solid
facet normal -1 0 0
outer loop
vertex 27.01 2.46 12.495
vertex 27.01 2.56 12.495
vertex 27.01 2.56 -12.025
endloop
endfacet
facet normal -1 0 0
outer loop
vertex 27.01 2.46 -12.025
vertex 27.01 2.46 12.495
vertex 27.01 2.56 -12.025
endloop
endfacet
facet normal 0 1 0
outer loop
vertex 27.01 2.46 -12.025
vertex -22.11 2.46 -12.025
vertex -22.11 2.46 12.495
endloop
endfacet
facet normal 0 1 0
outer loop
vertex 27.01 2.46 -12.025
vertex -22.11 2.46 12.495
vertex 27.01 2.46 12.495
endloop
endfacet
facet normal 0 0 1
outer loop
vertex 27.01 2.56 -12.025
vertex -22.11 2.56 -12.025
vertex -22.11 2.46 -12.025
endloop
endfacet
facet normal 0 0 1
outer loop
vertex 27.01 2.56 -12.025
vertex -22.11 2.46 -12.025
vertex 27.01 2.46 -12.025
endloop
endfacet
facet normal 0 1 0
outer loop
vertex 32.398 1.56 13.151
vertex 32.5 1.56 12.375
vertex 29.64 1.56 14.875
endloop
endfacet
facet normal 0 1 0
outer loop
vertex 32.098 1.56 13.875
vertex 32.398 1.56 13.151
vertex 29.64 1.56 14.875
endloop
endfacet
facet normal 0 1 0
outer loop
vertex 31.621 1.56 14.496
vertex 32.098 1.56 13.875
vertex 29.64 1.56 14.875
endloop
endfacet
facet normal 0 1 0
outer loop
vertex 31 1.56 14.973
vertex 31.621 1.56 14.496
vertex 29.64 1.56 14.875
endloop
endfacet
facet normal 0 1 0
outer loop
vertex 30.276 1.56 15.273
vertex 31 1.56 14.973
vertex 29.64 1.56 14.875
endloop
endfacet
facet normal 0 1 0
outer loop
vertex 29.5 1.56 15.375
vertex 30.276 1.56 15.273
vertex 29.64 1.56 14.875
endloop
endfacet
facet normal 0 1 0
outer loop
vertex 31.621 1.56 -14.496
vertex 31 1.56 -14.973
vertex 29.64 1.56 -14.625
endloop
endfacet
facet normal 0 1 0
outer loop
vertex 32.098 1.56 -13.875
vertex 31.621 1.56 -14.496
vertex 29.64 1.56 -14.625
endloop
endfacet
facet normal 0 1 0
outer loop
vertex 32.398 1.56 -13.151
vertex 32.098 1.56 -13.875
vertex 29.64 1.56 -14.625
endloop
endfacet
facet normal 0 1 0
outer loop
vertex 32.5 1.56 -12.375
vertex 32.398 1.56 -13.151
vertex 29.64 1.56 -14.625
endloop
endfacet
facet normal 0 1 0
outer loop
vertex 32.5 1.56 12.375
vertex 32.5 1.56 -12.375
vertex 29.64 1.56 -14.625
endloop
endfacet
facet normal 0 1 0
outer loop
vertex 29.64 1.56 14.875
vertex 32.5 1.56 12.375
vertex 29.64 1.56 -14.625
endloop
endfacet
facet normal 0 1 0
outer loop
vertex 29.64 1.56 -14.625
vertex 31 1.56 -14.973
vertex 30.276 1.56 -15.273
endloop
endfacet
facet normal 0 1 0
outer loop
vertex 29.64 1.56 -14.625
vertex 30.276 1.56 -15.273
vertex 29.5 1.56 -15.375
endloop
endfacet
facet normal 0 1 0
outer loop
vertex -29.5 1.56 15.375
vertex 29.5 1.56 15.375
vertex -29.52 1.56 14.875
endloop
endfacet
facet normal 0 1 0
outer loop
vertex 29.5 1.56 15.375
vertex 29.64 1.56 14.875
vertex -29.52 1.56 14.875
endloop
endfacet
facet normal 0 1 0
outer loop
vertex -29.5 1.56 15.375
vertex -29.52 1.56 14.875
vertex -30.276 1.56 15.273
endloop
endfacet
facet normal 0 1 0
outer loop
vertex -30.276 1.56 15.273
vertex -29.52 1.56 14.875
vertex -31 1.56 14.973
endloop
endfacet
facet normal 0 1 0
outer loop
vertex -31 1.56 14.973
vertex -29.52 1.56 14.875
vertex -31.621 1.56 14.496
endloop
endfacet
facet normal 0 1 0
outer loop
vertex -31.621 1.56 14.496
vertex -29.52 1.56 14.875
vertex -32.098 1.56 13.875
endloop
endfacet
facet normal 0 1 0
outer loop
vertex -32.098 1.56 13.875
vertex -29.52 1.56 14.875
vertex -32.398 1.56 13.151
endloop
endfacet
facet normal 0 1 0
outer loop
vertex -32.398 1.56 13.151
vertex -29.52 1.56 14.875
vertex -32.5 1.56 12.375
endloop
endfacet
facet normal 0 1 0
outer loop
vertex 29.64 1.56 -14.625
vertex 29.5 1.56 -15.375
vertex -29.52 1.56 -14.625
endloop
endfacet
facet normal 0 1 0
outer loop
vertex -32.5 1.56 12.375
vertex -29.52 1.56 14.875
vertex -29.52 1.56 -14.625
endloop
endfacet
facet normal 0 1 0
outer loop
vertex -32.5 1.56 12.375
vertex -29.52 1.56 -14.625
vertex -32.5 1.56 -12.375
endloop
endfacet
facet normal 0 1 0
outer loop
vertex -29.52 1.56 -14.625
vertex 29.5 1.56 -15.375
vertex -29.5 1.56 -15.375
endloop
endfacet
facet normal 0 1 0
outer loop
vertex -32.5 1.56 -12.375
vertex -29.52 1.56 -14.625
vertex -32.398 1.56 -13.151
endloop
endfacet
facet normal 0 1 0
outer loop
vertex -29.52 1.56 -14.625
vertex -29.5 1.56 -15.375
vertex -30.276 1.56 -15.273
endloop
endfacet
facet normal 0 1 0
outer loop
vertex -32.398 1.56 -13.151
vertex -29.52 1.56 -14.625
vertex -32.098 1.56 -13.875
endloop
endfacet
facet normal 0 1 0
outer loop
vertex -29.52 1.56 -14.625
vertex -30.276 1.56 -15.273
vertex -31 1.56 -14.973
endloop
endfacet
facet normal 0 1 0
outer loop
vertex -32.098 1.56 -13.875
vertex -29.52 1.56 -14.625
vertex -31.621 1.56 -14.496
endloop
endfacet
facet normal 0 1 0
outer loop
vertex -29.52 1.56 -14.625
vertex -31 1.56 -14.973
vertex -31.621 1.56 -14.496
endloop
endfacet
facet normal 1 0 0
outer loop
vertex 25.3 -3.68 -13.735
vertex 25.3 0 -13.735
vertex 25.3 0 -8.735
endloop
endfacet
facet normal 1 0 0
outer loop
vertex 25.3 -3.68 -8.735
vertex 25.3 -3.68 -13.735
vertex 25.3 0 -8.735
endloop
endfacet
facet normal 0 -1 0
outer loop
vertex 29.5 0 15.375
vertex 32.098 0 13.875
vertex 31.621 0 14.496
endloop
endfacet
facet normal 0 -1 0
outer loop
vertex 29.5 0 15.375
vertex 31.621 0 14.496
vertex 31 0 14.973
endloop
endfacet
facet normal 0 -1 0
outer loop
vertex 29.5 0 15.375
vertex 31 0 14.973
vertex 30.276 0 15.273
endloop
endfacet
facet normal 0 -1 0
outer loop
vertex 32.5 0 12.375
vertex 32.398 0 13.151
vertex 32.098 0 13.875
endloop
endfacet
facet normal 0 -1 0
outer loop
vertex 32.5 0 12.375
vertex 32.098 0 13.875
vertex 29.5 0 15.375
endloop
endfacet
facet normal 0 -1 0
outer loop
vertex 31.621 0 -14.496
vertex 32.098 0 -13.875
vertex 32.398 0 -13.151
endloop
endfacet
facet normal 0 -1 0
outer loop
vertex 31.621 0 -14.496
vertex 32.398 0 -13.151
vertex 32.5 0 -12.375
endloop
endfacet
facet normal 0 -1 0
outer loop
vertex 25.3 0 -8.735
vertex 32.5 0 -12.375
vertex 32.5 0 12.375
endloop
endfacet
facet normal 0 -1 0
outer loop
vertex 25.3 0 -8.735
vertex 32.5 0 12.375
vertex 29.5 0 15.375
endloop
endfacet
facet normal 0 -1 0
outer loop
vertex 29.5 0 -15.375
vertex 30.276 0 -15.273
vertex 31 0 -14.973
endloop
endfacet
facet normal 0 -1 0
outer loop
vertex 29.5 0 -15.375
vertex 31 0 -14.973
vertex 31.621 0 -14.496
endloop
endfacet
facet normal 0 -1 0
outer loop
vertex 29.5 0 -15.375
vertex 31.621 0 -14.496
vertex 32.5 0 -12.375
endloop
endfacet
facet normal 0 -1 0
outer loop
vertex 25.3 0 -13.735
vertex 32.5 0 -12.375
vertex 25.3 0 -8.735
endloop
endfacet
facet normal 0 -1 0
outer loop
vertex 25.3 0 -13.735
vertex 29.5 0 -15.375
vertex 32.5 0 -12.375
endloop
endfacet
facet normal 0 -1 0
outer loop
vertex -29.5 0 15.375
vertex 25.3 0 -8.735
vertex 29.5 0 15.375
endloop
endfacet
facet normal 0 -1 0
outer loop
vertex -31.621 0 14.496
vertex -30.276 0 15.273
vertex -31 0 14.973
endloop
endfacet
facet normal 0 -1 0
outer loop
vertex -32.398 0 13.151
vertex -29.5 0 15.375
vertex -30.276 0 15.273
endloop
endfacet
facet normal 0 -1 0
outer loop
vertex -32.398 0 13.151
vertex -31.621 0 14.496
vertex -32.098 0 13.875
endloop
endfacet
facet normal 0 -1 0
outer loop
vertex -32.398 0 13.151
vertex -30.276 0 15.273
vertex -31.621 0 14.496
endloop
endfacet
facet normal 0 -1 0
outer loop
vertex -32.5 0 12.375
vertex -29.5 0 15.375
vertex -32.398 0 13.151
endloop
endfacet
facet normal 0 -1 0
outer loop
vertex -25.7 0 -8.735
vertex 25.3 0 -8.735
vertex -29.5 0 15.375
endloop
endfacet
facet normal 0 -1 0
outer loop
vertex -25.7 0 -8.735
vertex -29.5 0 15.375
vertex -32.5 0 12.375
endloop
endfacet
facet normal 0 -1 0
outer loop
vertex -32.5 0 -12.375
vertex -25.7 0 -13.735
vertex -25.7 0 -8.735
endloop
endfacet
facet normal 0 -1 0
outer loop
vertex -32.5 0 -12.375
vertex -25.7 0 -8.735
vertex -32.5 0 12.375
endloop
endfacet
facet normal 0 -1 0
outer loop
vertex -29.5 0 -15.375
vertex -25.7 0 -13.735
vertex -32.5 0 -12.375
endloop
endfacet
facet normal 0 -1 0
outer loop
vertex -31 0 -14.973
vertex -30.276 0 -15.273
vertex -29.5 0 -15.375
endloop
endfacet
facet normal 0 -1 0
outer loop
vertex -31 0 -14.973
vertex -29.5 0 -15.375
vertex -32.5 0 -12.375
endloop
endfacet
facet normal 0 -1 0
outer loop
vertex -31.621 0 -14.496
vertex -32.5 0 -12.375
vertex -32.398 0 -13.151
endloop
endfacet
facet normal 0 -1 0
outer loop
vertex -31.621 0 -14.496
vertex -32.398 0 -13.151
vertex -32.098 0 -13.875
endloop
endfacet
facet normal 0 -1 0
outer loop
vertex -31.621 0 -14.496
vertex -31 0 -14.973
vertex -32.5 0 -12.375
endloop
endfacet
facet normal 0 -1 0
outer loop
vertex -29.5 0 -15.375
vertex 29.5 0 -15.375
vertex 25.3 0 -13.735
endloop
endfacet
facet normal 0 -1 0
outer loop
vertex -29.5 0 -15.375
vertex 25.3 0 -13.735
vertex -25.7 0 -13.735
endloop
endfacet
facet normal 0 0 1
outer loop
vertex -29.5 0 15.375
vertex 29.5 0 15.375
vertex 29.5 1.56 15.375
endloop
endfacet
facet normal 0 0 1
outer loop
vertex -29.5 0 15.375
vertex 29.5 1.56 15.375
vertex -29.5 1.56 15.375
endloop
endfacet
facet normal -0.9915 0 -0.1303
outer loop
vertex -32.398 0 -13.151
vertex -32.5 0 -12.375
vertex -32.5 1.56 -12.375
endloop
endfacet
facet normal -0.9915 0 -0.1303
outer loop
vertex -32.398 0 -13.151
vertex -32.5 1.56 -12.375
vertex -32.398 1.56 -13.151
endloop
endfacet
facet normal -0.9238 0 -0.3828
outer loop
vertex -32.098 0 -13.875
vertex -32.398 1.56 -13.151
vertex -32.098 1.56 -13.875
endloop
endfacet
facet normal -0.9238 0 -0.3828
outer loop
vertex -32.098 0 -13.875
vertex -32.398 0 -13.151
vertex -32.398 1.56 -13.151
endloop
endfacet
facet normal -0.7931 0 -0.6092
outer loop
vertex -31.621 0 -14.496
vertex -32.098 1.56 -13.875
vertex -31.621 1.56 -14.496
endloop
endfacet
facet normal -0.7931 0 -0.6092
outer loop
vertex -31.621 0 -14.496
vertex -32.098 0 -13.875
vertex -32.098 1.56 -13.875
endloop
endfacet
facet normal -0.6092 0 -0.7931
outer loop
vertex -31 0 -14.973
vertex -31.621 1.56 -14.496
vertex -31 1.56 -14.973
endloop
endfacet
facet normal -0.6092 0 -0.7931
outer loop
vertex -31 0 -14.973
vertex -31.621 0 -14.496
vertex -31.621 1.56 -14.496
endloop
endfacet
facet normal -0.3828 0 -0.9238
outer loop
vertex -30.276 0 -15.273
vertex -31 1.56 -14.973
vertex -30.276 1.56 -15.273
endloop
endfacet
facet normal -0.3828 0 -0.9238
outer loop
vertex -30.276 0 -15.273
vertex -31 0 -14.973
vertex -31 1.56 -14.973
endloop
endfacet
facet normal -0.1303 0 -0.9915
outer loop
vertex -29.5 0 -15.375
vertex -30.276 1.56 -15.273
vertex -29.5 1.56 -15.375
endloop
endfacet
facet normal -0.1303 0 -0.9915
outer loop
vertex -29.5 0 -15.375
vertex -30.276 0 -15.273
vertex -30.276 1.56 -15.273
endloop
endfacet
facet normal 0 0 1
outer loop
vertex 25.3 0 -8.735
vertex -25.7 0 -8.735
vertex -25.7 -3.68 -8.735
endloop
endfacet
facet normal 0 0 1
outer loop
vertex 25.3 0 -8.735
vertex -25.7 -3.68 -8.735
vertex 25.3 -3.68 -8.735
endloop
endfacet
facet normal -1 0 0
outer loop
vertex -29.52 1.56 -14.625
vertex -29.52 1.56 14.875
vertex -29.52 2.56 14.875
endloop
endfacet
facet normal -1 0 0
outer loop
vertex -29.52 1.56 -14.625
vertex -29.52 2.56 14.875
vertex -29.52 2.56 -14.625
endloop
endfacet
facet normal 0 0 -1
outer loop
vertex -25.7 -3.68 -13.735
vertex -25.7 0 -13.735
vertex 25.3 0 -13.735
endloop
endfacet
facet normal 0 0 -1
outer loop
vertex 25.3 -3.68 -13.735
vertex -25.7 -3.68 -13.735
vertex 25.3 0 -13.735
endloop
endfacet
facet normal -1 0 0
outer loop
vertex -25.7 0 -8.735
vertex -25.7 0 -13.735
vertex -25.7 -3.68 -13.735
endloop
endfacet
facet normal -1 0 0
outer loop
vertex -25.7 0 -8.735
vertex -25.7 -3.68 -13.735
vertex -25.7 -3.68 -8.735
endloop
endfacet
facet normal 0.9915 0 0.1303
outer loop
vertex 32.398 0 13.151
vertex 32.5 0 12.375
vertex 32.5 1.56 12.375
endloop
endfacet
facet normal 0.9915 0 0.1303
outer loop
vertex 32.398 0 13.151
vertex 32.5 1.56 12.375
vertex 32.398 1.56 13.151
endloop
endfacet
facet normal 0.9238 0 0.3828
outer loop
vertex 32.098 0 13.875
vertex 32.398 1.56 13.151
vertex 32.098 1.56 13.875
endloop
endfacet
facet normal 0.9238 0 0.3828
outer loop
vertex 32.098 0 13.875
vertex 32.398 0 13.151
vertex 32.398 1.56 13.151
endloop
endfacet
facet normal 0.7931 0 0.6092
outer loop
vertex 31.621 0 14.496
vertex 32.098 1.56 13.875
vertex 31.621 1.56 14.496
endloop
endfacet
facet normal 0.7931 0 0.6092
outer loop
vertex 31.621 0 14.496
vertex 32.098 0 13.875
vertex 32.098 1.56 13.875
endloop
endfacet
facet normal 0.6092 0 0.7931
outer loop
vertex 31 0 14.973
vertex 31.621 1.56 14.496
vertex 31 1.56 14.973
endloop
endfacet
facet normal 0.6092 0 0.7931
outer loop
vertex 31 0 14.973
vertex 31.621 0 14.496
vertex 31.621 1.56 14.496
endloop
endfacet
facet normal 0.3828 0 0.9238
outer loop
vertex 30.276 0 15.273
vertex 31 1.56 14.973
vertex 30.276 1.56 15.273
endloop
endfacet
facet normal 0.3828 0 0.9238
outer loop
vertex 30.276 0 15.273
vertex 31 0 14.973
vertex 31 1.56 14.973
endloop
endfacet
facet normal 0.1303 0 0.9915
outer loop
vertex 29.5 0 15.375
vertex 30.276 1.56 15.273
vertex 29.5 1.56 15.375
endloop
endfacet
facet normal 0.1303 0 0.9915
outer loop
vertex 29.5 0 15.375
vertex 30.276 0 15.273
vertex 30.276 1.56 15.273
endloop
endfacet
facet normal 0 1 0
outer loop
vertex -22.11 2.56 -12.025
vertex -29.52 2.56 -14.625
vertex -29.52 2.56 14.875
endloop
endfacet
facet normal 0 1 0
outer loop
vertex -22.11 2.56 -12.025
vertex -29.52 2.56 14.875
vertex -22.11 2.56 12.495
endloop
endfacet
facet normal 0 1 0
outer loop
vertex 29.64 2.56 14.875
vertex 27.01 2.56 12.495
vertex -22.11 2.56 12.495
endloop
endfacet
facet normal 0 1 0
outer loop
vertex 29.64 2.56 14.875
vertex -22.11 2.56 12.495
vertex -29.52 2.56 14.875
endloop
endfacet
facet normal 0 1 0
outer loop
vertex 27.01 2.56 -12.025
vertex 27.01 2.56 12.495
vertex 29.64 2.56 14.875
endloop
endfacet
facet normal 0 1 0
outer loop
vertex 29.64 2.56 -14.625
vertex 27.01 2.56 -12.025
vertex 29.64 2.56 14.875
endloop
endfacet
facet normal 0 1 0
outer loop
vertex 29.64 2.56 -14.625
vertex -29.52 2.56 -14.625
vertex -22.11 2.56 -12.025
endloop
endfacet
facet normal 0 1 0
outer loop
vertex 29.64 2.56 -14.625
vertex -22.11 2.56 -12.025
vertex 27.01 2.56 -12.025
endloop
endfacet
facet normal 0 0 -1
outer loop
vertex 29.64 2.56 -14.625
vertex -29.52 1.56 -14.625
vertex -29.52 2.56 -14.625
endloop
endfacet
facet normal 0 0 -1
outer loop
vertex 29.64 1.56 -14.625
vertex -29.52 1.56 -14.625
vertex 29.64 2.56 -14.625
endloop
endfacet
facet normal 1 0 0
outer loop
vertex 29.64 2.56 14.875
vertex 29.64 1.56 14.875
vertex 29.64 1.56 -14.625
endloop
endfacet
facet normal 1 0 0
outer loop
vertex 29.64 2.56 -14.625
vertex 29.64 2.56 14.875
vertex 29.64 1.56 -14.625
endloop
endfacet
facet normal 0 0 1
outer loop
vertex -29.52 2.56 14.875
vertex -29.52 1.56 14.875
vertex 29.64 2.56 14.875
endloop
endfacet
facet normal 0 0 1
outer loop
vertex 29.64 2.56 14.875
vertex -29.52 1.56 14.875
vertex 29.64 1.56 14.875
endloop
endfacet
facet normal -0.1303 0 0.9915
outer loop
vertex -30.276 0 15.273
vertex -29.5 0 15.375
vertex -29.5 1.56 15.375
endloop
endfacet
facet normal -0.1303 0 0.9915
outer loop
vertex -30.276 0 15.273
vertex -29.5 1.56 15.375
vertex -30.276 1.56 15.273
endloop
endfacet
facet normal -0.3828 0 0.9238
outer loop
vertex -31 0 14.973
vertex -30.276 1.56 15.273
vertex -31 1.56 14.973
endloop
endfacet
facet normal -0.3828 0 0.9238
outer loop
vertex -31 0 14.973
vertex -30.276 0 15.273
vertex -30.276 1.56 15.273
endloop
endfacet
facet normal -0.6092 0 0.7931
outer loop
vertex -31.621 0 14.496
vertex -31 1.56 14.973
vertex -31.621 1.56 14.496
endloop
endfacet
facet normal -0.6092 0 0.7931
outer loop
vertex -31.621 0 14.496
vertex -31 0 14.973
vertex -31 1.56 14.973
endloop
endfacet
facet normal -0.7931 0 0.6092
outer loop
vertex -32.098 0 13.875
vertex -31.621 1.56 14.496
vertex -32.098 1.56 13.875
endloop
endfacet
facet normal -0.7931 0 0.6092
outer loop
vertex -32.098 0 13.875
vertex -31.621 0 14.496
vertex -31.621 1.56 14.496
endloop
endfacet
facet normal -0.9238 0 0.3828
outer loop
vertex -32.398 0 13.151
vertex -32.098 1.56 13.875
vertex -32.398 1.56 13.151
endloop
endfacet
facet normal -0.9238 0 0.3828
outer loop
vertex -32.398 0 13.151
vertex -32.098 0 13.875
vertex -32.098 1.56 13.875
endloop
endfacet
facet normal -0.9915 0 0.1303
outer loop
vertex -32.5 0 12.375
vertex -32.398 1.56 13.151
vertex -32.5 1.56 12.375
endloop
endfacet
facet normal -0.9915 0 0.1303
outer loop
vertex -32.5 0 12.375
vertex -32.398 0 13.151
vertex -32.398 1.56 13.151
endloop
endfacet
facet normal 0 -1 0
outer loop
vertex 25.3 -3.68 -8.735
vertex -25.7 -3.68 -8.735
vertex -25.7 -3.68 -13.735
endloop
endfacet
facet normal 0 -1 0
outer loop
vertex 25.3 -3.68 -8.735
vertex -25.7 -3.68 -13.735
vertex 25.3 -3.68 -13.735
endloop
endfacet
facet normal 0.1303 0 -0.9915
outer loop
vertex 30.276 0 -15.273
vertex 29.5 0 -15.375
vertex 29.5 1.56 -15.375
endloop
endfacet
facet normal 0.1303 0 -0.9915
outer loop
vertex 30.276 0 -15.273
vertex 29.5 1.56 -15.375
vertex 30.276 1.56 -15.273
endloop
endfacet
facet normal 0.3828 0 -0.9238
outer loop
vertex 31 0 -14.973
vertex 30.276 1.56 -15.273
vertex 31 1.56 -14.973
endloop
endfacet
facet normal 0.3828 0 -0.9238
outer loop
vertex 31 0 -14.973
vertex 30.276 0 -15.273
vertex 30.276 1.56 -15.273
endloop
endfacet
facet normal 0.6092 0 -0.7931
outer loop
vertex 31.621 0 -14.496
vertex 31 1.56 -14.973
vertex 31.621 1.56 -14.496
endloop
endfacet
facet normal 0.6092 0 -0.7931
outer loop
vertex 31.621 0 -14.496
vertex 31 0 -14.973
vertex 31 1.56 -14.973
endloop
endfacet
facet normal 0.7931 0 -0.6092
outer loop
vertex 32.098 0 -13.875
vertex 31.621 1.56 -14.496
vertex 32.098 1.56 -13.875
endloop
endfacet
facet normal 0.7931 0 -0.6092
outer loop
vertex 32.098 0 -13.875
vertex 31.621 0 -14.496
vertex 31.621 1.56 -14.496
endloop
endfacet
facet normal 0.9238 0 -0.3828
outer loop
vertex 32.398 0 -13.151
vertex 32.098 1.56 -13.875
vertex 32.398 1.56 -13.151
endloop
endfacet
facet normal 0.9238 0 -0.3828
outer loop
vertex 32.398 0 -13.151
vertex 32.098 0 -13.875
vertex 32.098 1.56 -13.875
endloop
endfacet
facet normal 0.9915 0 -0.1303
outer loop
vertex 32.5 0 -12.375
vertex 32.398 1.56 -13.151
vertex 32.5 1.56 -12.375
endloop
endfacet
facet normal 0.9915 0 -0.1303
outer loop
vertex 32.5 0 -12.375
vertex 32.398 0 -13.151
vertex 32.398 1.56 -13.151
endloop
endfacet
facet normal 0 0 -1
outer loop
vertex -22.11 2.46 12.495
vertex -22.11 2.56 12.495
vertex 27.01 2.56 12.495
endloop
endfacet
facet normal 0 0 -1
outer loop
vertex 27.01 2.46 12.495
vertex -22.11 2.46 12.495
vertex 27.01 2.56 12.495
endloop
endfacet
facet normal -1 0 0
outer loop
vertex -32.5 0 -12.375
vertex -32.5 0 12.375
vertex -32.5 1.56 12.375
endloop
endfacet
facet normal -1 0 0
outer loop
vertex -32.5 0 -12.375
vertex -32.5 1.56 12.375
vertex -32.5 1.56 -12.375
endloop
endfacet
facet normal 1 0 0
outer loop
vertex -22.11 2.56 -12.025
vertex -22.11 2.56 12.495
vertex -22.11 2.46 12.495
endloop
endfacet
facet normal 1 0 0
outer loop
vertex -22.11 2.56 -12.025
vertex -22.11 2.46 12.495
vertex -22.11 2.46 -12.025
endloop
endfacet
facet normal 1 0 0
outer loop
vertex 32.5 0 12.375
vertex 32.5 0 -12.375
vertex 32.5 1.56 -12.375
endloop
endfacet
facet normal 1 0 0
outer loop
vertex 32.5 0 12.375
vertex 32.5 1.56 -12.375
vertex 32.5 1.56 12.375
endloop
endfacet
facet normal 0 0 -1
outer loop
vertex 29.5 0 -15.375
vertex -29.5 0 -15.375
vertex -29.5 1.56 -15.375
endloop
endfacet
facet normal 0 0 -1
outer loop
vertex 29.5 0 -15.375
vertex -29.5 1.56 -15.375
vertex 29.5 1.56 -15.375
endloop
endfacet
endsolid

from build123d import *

# Parameters (mm, degrees)
EXTRUDE_1_DEPTH     = 1.56
SKETCH_3_W          = 59.16
SKETCH_3_H          = 29.5
EXTRUDE_2_DEPTH     = 1
SKETCH_8_W          = 51
SKETCH_8_H          = 5
EXTRUDE_6_DEPTH     = 3.68
SKETCH_9_W          = 49.12
SKETCH_9_H          = 24.52
CUT_EXTRUDE_1_DEPTH = 0.1


with BuildPart() as part:
    # 草图1 → 凸台-拉伸1 (new body)
    with BuildSketch(Plane(origin=(0, 0, 0), x_dir=(1, 0, 0), z_dir=(0, 1, 0))):
        with BuildLine():
            Line((-29.5, 15.375), (29.5, 15.375))
            ThreePointArc((29.5, 15.375), (31.621320344, 14.496320344), (32.5, 12.375))
            Line((32.5, 12.375), (32.5, -12.375))
            ThreePointArc((32.5, -12.375), (31.621320344, -14.496320344), (29.5, -15.375))
            Line((29.5, -15.375), (-29.5, -15.375))
            ThreePointArc((-29.5, -15.375), (-31.621320344, -14.496320344), (-32.5, -12.375))
            Line((-32.5, -12.375), (-32.5, 12.375))
            ThreePointArc((-32.5, 12.375), (-31.621320344, 14.496320344), (-29.5, 15.375))
        make_face()
    extrude(amount=EXTRUDE_1_DEPTH)

    # 草图3 → 凸台-拉伸2 (add)
    with BuildSketch(Plane(origin=(0, 1.56, 0), x_dir=(1, 0, 0), z_dir=(0, 1, 0))):
        with Locations((0.06, -0.125)):
            Rectangle(SKETCH_3_W, SKETCH_3_H)
    extrude(amount=EXTRUDE_2_DEPTH)

    # 草图8 → 凸台-拉伸6 (add)
    with BuildSketch(Plane.XZ):
        with Locations((-0.2, -11.235)):
            Rectangle(SKETCH_8_W, SKETCH_8_H)
    extrude(amount=EXTRUDE_6_DEPTH)

    # 草图9 → 切除-拉伸1 (cut)
    with BuildSketch(Plane(origin=(0, 2.56, 0), x_dir=(1, 0, 0), z_dir=(0, 1, 0))):
        with Locations((2.45, -0.235)):
            Rectangle(SKETCH_9_W, SKETCH_9_H)
    extrude(amount=-CUT_EXTRUDE_1_DEPTH, mode=Mode.SUBTRACT)


solid = part.part
